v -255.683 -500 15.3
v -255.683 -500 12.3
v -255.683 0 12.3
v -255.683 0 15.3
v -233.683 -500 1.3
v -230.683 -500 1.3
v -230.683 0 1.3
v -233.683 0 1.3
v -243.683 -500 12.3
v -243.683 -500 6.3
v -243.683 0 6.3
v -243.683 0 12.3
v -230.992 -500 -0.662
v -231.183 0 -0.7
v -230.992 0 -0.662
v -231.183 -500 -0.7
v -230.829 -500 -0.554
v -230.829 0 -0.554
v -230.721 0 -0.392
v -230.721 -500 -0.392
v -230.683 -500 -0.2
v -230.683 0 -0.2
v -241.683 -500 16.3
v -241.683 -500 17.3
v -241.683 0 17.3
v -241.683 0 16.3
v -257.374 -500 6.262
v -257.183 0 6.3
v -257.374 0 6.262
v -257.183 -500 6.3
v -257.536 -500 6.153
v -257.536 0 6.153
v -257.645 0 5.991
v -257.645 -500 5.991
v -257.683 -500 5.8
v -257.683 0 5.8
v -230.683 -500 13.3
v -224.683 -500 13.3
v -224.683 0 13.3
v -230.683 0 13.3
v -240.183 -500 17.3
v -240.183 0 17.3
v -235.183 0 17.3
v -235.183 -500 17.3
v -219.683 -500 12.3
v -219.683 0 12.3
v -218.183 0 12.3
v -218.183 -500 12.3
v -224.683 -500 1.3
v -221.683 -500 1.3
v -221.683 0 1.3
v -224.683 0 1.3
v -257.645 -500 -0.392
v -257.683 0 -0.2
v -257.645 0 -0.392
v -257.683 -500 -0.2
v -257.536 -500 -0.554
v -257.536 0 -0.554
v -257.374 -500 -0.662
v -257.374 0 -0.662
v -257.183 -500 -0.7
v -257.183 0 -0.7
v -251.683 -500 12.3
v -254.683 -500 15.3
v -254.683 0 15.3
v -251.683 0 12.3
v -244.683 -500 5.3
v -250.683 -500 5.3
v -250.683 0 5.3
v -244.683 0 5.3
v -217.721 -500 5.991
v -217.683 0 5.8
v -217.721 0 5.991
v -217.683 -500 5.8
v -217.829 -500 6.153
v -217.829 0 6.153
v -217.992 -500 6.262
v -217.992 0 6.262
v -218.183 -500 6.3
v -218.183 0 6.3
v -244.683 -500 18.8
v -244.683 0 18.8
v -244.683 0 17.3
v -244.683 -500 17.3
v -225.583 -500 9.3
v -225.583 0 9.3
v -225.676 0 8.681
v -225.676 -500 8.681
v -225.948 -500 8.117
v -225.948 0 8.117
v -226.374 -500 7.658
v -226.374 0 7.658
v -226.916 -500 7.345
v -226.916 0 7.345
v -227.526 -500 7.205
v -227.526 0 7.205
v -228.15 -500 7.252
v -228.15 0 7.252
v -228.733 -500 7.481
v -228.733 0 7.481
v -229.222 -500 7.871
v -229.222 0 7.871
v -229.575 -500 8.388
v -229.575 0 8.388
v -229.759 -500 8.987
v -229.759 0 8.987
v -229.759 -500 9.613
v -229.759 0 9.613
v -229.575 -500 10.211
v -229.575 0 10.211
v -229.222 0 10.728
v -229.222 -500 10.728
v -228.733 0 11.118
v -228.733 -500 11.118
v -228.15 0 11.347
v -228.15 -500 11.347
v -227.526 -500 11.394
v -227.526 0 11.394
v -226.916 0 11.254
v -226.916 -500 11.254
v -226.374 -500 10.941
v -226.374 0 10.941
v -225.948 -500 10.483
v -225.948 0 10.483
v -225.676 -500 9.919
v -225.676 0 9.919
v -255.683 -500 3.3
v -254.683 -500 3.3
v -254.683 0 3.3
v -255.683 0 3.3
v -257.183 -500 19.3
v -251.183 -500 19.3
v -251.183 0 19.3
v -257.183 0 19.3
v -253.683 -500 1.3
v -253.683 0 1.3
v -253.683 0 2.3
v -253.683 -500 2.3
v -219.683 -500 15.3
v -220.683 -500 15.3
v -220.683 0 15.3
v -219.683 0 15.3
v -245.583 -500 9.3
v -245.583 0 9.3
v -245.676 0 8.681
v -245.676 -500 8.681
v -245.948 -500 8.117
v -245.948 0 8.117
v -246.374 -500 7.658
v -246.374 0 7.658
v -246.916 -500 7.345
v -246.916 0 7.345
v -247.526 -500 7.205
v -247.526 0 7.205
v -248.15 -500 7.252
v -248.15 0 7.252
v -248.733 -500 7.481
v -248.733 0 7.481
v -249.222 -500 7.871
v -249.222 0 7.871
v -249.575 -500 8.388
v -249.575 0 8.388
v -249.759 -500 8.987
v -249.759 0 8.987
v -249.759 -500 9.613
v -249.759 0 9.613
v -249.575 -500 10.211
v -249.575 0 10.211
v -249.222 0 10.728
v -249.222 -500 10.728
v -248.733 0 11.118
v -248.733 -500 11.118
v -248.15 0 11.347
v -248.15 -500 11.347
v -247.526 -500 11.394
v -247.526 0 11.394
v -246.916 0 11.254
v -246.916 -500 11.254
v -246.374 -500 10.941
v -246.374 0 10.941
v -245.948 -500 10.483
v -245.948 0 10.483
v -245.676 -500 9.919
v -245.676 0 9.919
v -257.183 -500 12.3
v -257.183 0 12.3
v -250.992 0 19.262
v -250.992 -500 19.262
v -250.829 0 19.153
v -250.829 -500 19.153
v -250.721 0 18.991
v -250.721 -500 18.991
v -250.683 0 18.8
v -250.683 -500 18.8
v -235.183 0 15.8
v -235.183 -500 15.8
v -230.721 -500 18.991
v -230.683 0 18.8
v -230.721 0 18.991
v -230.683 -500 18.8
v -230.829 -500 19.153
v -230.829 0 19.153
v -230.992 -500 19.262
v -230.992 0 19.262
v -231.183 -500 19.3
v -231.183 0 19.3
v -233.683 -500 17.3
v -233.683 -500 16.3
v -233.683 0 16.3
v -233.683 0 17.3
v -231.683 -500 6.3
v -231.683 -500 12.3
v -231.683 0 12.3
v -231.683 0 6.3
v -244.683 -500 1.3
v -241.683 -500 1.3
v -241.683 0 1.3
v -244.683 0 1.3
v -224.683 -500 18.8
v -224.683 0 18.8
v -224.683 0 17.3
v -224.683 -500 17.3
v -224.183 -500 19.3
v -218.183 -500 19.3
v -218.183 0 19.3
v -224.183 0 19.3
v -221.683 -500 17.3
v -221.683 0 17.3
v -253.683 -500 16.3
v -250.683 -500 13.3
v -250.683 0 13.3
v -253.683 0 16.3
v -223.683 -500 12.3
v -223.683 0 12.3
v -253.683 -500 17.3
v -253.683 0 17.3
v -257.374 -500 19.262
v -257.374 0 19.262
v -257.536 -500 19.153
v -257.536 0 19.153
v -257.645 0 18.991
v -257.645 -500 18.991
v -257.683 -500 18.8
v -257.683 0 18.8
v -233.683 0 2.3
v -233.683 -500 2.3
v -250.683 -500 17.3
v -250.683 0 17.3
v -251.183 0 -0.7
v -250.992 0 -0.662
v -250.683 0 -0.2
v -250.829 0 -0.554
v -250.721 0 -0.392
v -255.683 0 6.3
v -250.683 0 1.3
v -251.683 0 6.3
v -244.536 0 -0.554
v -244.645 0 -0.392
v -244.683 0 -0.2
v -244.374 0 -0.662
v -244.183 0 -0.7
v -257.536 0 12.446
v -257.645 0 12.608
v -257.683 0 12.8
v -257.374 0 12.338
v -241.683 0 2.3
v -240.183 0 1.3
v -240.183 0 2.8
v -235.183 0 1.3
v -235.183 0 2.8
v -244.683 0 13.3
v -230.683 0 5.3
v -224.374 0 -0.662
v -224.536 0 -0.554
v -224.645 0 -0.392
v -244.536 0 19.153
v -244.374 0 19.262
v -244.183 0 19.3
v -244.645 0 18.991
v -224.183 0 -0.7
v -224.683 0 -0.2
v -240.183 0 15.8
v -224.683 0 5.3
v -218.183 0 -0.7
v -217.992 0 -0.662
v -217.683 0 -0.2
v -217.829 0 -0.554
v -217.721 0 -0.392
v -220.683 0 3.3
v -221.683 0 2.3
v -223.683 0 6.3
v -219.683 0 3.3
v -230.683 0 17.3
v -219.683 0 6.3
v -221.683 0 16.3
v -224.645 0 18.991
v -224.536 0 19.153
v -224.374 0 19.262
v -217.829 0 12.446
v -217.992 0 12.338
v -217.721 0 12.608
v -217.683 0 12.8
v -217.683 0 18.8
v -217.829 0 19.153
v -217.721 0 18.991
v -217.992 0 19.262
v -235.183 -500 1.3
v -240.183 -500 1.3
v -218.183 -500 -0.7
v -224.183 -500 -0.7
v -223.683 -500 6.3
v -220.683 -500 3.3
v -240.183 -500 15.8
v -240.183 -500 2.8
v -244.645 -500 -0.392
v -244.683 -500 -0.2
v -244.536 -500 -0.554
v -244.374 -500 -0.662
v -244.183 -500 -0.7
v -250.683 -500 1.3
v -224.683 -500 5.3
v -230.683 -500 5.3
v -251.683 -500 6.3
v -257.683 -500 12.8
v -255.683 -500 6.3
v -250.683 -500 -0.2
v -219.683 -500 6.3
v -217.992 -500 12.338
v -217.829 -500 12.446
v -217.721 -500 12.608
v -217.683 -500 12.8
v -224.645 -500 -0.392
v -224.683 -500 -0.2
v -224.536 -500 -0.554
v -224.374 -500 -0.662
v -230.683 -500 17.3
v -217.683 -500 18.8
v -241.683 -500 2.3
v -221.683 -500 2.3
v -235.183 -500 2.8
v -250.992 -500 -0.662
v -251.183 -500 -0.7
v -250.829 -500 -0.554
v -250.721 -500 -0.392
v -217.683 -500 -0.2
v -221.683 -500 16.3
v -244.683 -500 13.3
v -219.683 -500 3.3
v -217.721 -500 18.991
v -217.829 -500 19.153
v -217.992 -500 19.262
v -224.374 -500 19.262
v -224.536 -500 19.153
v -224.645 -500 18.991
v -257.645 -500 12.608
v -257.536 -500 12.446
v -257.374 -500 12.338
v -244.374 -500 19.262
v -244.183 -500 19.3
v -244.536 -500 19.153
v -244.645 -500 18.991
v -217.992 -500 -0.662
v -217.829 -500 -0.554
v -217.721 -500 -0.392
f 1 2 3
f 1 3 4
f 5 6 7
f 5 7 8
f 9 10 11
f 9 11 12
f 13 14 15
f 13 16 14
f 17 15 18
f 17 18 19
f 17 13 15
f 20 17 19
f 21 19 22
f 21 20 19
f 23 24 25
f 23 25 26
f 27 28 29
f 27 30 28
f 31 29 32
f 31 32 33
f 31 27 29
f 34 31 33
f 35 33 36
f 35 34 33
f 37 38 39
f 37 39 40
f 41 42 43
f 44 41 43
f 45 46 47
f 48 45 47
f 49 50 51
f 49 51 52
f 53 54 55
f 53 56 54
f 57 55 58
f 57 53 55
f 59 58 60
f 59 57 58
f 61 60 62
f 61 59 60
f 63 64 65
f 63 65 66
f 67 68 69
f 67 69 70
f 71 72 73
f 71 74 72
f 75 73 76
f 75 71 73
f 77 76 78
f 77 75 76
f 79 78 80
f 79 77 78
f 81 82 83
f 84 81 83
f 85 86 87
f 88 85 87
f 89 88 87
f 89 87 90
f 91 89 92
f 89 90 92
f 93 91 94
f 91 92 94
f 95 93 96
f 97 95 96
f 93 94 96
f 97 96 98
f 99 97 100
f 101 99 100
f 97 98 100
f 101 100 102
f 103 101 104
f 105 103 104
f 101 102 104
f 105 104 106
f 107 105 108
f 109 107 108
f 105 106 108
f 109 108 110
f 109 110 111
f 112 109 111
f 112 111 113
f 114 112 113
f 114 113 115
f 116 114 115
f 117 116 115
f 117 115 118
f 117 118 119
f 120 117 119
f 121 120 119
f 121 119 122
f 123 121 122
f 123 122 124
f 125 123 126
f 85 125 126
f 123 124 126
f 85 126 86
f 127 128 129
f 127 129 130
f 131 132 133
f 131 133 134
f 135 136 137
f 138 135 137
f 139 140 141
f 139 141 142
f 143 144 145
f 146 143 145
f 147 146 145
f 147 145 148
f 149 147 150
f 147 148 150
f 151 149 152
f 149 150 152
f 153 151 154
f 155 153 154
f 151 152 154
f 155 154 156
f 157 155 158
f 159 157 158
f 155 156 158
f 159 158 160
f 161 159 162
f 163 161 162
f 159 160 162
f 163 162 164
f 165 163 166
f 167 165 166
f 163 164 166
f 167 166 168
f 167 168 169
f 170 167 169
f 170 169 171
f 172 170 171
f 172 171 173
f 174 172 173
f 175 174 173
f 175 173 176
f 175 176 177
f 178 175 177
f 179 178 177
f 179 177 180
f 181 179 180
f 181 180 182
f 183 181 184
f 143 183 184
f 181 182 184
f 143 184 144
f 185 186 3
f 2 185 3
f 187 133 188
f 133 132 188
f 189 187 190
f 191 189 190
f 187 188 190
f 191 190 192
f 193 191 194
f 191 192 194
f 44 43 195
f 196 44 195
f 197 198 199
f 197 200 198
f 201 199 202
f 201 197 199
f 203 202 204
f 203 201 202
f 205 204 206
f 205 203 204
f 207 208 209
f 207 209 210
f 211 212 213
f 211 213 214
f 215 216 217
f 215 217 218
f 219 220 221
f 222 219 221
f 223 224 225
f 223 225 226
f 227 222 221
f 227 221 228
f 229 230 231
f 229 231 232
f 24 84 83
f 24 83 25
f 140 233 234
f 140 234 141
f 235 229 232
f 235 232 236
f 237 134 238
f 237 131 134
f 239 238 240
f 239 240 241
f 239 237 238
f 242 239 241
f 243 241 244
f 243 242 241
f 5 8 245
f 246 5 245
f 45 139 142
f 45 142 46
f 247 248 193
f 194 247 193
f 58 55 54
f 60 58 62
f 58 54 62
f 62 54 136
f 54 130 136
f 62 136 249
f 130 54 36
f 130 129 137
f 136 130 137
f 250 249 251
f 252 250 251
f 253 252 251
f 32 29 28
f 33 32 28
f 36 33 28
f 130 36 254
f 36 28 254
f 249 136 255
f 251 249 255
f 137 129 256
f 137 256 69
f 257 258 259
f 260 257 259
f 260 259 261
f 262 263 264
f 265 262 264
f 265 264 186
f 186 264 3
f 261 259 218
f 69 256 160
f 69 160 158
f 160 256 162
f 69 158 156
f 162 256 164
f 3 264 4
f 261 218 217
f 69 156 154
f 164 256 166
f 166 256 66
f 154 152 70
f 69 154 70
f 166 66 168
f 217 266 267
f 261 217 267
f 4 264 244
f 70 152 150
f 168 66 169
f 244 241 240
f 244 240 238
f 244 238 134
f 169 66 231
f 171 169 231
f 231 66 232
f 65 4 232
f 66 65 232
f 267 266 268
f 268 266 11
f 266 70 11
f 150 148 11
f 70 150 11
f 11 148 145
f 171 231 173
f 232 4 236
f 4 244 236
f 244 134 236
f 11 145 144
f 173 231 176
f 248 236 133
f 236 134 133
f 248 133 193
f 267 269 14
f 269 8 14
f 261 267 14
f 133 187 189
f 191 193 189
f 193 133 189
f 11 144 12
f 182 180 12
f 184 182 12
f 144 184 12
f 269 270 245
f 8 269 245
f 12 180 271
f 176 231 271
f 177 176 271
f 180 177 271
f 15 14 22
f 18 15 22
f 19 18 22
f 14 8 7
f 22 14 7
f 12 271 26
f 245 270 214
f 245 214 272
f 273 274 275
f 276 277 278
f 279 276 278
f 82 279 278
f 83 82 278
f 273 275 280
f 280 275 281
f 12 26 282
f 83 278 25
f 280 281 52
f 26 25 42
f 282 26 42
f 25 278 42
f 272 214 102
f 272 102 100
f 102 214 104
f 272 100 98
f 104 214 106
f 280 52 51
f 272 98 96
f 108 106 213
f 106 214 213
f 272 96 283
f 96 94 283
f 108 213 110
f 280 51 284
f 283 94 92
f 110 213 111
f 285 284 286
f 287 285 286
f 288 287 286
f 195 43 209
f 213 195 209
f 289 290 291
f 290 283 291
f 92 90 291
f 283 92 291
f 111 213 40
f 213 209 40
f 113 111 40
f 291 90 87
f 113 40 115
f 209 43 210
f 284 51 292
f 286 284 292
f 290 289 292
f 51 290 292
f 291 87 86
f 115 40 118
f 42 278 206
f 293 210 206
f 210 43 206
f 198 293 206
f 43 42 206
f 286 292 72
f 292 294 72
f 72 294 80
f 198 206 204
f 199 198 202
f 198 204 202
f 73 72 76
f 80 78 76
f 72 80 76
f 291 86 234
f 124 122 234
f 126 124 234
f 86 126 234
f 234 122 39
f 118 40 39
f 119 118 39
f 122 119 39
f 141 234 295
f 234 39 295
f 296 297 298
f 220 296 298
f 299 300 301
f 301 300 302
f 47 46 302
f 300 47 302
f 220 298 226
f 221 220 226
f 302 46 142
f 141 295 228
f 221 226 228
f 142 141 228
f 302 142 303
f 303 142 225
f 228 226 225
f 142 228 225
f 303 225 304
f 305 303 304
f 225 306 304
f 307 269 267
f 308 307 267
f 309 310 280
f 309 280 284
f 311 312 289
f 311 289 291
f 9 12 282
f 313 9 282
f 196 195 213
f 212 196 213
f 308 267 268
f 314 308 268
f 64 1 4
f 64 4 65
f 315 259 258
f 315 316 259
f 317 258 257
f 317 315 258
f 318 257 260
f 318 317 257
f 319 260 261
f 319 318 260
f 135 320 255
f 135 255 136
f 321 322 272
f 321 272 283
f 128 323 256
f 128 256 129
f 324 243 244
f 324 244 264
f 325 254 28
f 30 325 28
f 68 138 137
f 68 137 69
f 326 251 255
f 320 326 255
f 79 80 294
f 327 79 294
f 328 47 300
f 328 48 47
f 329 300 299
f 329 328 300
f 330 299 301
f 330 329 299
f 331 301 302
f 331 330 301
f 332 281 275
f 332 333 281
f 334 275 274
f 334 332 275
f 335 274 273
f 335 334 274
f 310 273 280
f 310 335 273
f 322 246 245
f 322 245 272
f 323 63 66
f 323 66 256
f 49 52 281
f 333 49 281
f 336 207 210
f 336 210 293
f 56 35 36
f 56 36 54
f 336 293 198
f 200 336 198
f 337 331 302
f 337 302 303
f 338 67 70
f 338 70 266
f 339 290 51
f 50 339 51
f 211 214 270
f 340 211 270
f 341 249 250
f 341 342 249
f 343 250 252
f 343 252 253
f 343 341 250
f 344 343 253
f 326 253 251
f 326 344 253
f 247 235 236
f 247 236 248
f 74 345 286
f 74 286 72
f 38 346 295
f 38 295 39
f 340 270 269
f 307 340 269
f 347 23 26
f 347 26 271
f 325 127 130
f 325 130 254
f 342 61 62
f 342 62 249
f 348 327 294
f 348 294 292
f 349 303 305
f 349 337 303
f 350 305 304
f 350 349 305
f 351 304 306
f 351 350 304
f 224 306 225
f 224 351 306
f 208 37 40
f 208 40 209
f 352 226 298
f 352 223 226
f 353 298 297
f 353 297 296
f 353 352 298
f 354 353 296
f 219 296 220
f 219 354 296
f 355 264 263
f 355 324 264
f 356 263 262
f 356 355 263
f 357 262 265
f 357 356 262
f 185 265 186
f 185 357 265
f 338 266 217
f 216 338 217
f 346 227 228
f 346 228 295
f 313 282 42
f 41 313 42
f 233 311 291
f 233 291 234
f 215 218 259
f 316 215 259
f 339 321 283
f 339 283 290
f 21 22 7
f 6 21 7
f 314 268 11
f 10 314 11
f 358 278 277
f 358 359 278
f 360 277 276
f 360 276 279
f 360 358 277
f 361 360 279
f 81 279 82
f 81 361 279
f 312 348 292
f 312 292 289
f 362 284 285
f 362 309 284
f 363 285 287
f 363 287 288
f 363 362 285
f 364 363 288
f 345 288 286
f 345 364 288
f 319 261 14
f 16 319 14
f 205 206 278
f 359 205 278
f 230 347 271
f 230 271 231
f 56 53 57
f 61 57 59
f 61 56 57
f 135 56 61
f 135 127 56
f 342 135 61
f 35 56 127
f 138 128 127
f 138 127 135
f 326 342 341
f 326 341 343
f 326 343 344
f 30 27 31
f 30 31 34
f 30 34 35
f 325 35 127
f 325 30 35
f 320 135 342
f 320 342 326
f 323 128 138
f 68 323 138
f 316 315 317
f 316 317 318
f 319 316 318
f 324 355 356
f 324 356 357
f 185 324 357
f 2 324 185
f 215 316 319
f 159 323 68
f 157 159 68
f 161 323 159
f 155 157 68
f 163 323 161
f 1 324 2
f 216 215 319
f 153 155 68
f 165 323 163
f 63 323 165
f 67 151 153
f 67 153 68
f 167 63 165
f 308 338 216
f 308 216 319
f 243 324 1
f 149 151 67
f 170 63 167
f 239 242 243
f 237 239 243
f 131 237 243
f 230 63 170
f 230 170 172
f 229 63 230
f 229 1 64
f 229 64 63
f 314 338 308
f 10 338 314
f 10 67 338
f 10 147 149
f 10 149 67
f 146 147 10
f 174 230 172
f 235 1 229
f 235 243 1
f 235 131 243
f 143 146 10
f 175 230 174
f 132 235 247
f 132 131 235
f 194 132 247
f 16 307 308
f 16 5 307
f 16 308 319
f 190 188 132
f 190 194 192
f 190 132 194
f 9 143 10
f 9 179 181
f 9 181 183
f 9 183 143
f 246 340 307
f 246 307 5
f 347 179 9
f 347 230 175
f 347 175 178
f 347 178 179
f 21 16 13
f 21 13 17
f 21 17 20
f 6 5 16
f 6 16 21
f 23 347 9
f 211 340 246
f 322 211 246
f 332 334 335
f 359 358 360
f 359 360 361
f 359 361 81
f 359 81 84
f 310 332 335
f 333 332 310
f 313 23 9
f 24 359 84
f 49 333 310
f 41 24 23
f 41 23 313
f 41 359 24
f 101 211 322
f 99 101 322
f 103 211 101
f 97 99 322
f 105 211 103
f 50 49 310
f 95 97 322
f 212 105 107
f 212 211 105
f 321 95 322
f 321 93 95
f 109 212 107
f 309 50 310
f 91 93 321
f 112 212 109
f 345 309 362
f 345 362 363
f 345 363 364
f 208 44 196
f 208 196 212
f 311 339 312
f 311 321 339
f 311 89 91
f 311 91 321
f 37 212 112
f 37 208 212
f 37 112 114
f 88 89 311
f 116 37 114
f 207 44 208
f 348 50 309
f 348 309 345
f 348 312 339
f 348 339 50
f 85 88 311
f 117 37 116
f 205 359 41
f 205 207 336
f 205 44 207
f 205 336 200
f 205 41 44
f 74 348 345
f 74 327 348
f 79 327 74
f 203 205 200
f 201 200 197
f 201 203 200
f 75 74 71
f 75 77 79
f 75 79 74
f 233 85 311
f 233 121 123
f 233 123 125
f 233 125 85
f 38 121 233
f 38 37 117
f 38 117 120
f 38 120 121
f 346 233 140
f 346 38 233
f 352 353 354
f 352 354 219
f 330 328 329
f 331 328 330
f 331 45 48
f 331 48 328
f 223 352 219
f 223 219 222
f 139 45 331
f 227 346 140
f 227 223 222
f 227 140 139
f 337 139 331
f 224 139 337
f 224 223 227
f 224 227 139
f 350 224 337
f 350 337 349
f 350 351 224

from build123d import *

# Parameters (mm, degrees)
F1_DEPTH = 500
F2_R     = 0.5


with BuildPart() as f1:
    # F0 (on Front) → F1 (new body)
    with BuildSketch(Plane.XZ):
        Polygon((-250.682858482, 19.2996120907), (-257.682858482, 19.2996120907), (-257.682858482, 12.2996120907), (-255.682858482, 12.2996120907), (-255.682858482, 15.2996120907), (-254.682858482, 15.2996120907), (-251.682858482, 12.2996120907), (-251.682858482, 13.2996120907), (-250.682858482, 13.2996120907), (-253.682858482, 16.2996120907), (-253.682858482, 17.2996120907), (-250.682858482, 17.2996120907), align=None)
        Polygon((-237.682858482, 19.2996120907), (-244.682858482, 19.2996120907), (-244.682858482, 17.2996120907), (-241.682858482, 17.2996120907), (-241.682858482, 16.2996120907), (-244.682858482, 13.2996120907), (-243.682858482, 13.2996120907), (-243.682858482, 12.2996120907), (-240.182858482, 15.7996120907), (-240.182858482, 17.2996120907), (-237.682858482, 17.2996120907), align=None)
        Polygon((-230.682858482, 19.2996120907), (-237.682858482, 19.2996120907), (-237.682858482, 17.2996120907), (-235.182858482, 17.2996120907), (-235.182858482, 15.7996120907), (-231.682858482, 12.2996120907), (-231.682858482, 13.2996120907), (-230.682858482, 13.2996120907), (-233.682858482, 16.2996120907), (-233.682858482, 17.2996120907), (-230.682858482, 17.2996120907), align=None)
        Polygon((-255.682858482, 6.2996120907), (-257.682858482, 6.2996120907), (-257.682858482, -0.7003879093), (-250.682858482, -0.7003879093), (-250.682858482, 1.2996120907), (-253.682858482, 1.2996120907), (-253.682858482, 2.2996120907), (-250.682858482, 5.2996120907), (-251.682858482, 5.2996120907), (-251.682858482, 6.2996120907), (-254.682858482, 3.2996120907), (-255.682858482, 3.2996120907), align=None)
        with BuildLine():
            ThreePointArc((-247.6828584684, 5.2996120907), (-250.5112856019, 6.4711849611), (-251.682858482, 9.2996120907))
            Line((-251.682858482, 9.2996120907), (-251.682858482, 6.2996120907))
            Line((-251.682858482, 6.2996120907), (-251.682858482, 5.2996120907))
            Line((-251.682858482, 5.2996120907), (-250.682858482, 5.2996120907))
            Line((-250.682858482, 5.2996120907), (-247.6828584684, 5.2996120907))
        make_face()
        with BuildLine():
            Line((-251.682858482, 12.2996120907), (-251.682858482, 9.2996120907))
            ThreePointArc((-251.682858482, 9.2996120907), (-250.5112856067, 12.1280392154), (-247.682858482, 13.2996120907))
            Line((-247.682858482, 13.2996120907), (-250.682858482, 13.2996120907))
            Line((-250.682858482, 13.2996120907), (-251.682858482, 13.2996120907))
            Line((-251.682858482, 13.2996120907), (-251.682858482, 12.2996120907))
        make_face()
        with BuildLine():
            Line((-249.782858482, 9.2996120907), (-251.682858482, 9.2996120907))
            ThreePointArc((-251.682858482, 9.2996120907), (-250.5112856019, 6.4711849611), (-247.6828584684, 5.2996120907))
            ThreePointArc((-247.6828584684, 5.2996120907), (-244.8544313524, 6.4711849708), (-243.682858482, 9.2996120907))
            Line((-243.682858482, 9.2996120907), (-245.582858482, 9.2996120907))
            ThreePointArc((-245.582858482, 9.2996120907), (-247.682858482, 7.1996120907), (-249.782858482, 9.2996120907))
        make_face()
        with BuildLine():
            ThreePointArc((-247.682858482, 13.2996120907), (-250.5112856067, 12.1280392154), (-251.682858482, 9.2996120907))
            Line((-251.682858482, 9.2996120907), (-249.782858482, 9.2996120907))
            ThreePointArc((-249.782858482, 9.2996120907), (-247.682858482, 11.3996120907), (-245.582858482, 9.2996120907))
            Line((-245.582858482, 9.2996120907), (-243.682858482, 9.2996120907))
            ThreePointArc((-243.682858482, 9.2996120907), (-244.8544313573, 12.1280392154), (-247.682858482, 13.2996120907))
        make_face()
        Polygon((-217.682858482, 19.2996120907), (-224.682858482, 19.2996120907), (-224.682858482, 17.2996120907), (-221.682858482, 17.2996120907), (-221.682858482, 16.2996120907), (-224.682858482, 13.2996120907), (-223.682858482, 13.2996120907), (-223.682858482, 12.2996120907), (-220.682858482, 15.2996120907), (-219.682858482, 15.2996120907), (-219.682858482, 12.2996120907), (-217.682858482, 12.2996120907), align=None)
        with BuildLine():
            Line((-244.682858482, 13.2996120907), (-247.682858482, 13.2996120907))
            ThreePointArc((-247.682858482, 13.2996120907), (-244.8544313573, 12.1280392154), (-243.682858482, 9.2996120907))
            Line((-243.682858482, 9.2996120907), (-243.682858482, 12.2996120907))
            Line((-243.682858482, 12.2996120907), (-243.682858482, 13.2996120907))
            Line((-243.682858482, 13.2996120907), (-244.682858482, 13.2996120907))
        make_face()
        with BuildLine():
            ThreePointArc((-243.682858482, 9.2996120907), (-244.8544313524, 6.4711849708), (-247.6828584684, 5.2996120907))
            Line((-247.6828584684, 5.2996120907), (-244.682858482, 5.2996120907))
            Line((-244.682858482, 5.2996120907), (-243.682858482, 5.2996120907))
            Line((-243.682858482, 5.2996120907), (-243.682858482, 6.2996120907))
            Line((-243.682858482, 6.2996120907), (-243.682858482, 9.2996120907))
        make_face()
        with BuildLine():
            ThreePointArc((-227.682858482, 5.2996120907), (-230.5112856067, 6.4711849659), (-231.682858482, 9.2996120907))
            Line((-231.682858482, 9.2996120907), (-231.682858482, 6.2996120907))
            Line((-231.682858482, 6.2996120907), (-231.682858482, 5.2996120907))
            Line((-231.682858482, 5.2996120907), (-230.682858482, 5.2996120907))
            Line((-230.682858482, 5.2996120907), (-227.682858482, 5.2996120907))
        make_face()
        with BuildLine():
            Line((-231.682858482, 12.2996120907), (-231.682858482, 9.2996120907))
            ThreePointArc((-231.682858482, 9.2996120907), (-230.5112856067, 12.1280392154), (-227.682858482, 13.2996120907))
            Line((-227.682858482, 13.2996120907), (-230.682858482, 13.2996120907))
            Line((-230.682858482, 13.2996120907), (-231.682858482, 13.2996120907))
            Line((-231.682858482, 13.2996120907), (-231.682858482, 12.2996120907))
        make_face()
        with BuildLine():
            Line((-229.782858482, 9.2996120907), (-231.682858482, 9.2996120907))
            ThreePointArc((-231.682858482, 9.2996120907), (-230.5112856067, 6.4711849659), (-227.682858482, 5.2996120907))
            ThreePointArc((-227.682858482, 5.2996120907), (-224.8544313573, 6.4711849659), (-223.682858482, 9.2996120907))
            Line((-223.682858482, 9.2996120907), (-225.582858482, 9.2996120907))
            ThreePointArc((-225.582858482, 9.2996120907), (-227.682858482, 7.1996120907), (-229.782858482, 9.2996120907))
        make_face()
        with BuildLine():
            ThreePointArc((-227.682858482, 13.2996120907), (-230.5112856067, 12.1280392154), (-231.682858482, 9.2996120907))
            Line((-231.682858482, 9.2996120907), (-229.782858482, 9.2996120907))
            ThreePointArc((-229.782858482, 9.2996120907), (-227.682858482, 11.3996120907), (-225.582858482, 9.2996120907))
            Line((-225.582858482, 9.2996120907), (-223.682858482, 9.2996120907))
            ThreePointArc((-223.682858482, 9.2996120907), (-224.8544313573, 12.1280392154), (-227.682858482, 13.2996120907))
        make_face()
        Polygon((-235.182858482, 1.2996120907), (-237.682858482, 1.2996120907), (-237.682858482, -0.7003879093), (-230.682858482, -0.7003879093), (-230.682858482, 1.2996120907), (-233.682858482, 1.2996120907), (-233.682858482, 2.2996120907), (-230.682858482, 5.2996120907), (-231.682858482, 5.2996120907), (-231.682858482, 6.2996120907), (-235.182858482, 2.7996120907), align=None)
        Polygon((-237.682858482, -0.7003879093), (-237.682858482, 1.2996120907), (-240.182858482, 1.2996120907), (-240.182858482, 2.7996120907), (-243.682858482, 6.2996120907), (-243.682858482, 5.2996120907), (-244.682858482, 5.2996120907), (-241.682858482, 2.2996120907), (-241.682858482, 1.2996120907), (-244.682858482, 1.2996120907), (-244.682858482, -0.7003879093), align=None)
        with BuildLine():
            Line((-224.682858482, 13.2996120907), (-227.682858482, 13.2996120907))
            ThreePointArc((-227.682858482, 13.2996120907), (-224.8544313573, 12.1280392154), (-223.682858482, 9.2996120907))
            Line((-223.682858482, 9.2996120907), (-223.682858482, 12.2996120907))
            Line((-223.682858482, 12.2996120907), (-223.682858482, 13.2996120907))
            Line((-223.682858482, 13.2996120907), (-224.682858482, 13.2996120907))
        make_face()
        with BuildLine():
            ThreePointArc((-223.682858482, 9.2996120907), (-224.8544313573, 6.4711849659), (-227.682858482, 5.2996120907))
            Line((-227.682858482, 5.2996120907), (-224.682858482, 5.2996120907))
            Line((-224.682858482, 5.2996120907), (-223.682858482, 5.2996120907))
            Line((-223.682858482, 5.2996120907), (-223.682858482, 6.2996120907))
            Line((-223.682858482, 6.2996120907), (-223.682858482, 9.2996120907))
        make_face()
        Polygon((-223.682858482, 5.2996120907), (-224.682858482, 5.2996120907), (-221.682858482, 2.2996120907), (-221.682858482, 1.2996120907), (-224.682858482, 1.2996120907), (-224.682858482, -0.7003879093), (-217.682858482, -0.7003879093), (-217.682858482, 6.2996120907), (-219.682858482, 6.2996120907), (-219.682858482, 3.2996120907), (-220.682858482, 3.2996120907), (-223.682858482, 6.2996120907), align=None)
    extrude(amount=F1_DEPTH)

    # F2
    f2_edges = [f1.edges().sort_by_distance(p)[0] for p in [
        (-257.682858, -250, 19.299612),
        (-250.682858, -250, 19.299612),
        (-244.682858, -250, 19.299612),
        (-230.682858, -250, 19.299612),
        (-224.682858, -250, 19.299612),
        (-217.682858, -250, 19.299612),
        (-217.682858, -250, 12.299612),
        (-217.682858, -250, 6.299612),
        (-217.682858, -250, -0.700388),
        (-230.682858, -250, -0.700388),
        (-250.682858, -250, -0.700388),
        (-257.682858, -250, 6.299612),
        (-257.682858, -250, 12.299612),
        (-257.682858, -250, -0.700388),
        (-244.682858, -250, -0.700388),
        (-224.682858, -250, -0.700388),
    ]]
    fillet(f2_edges, radius=F2_R)


solid = f1.part
